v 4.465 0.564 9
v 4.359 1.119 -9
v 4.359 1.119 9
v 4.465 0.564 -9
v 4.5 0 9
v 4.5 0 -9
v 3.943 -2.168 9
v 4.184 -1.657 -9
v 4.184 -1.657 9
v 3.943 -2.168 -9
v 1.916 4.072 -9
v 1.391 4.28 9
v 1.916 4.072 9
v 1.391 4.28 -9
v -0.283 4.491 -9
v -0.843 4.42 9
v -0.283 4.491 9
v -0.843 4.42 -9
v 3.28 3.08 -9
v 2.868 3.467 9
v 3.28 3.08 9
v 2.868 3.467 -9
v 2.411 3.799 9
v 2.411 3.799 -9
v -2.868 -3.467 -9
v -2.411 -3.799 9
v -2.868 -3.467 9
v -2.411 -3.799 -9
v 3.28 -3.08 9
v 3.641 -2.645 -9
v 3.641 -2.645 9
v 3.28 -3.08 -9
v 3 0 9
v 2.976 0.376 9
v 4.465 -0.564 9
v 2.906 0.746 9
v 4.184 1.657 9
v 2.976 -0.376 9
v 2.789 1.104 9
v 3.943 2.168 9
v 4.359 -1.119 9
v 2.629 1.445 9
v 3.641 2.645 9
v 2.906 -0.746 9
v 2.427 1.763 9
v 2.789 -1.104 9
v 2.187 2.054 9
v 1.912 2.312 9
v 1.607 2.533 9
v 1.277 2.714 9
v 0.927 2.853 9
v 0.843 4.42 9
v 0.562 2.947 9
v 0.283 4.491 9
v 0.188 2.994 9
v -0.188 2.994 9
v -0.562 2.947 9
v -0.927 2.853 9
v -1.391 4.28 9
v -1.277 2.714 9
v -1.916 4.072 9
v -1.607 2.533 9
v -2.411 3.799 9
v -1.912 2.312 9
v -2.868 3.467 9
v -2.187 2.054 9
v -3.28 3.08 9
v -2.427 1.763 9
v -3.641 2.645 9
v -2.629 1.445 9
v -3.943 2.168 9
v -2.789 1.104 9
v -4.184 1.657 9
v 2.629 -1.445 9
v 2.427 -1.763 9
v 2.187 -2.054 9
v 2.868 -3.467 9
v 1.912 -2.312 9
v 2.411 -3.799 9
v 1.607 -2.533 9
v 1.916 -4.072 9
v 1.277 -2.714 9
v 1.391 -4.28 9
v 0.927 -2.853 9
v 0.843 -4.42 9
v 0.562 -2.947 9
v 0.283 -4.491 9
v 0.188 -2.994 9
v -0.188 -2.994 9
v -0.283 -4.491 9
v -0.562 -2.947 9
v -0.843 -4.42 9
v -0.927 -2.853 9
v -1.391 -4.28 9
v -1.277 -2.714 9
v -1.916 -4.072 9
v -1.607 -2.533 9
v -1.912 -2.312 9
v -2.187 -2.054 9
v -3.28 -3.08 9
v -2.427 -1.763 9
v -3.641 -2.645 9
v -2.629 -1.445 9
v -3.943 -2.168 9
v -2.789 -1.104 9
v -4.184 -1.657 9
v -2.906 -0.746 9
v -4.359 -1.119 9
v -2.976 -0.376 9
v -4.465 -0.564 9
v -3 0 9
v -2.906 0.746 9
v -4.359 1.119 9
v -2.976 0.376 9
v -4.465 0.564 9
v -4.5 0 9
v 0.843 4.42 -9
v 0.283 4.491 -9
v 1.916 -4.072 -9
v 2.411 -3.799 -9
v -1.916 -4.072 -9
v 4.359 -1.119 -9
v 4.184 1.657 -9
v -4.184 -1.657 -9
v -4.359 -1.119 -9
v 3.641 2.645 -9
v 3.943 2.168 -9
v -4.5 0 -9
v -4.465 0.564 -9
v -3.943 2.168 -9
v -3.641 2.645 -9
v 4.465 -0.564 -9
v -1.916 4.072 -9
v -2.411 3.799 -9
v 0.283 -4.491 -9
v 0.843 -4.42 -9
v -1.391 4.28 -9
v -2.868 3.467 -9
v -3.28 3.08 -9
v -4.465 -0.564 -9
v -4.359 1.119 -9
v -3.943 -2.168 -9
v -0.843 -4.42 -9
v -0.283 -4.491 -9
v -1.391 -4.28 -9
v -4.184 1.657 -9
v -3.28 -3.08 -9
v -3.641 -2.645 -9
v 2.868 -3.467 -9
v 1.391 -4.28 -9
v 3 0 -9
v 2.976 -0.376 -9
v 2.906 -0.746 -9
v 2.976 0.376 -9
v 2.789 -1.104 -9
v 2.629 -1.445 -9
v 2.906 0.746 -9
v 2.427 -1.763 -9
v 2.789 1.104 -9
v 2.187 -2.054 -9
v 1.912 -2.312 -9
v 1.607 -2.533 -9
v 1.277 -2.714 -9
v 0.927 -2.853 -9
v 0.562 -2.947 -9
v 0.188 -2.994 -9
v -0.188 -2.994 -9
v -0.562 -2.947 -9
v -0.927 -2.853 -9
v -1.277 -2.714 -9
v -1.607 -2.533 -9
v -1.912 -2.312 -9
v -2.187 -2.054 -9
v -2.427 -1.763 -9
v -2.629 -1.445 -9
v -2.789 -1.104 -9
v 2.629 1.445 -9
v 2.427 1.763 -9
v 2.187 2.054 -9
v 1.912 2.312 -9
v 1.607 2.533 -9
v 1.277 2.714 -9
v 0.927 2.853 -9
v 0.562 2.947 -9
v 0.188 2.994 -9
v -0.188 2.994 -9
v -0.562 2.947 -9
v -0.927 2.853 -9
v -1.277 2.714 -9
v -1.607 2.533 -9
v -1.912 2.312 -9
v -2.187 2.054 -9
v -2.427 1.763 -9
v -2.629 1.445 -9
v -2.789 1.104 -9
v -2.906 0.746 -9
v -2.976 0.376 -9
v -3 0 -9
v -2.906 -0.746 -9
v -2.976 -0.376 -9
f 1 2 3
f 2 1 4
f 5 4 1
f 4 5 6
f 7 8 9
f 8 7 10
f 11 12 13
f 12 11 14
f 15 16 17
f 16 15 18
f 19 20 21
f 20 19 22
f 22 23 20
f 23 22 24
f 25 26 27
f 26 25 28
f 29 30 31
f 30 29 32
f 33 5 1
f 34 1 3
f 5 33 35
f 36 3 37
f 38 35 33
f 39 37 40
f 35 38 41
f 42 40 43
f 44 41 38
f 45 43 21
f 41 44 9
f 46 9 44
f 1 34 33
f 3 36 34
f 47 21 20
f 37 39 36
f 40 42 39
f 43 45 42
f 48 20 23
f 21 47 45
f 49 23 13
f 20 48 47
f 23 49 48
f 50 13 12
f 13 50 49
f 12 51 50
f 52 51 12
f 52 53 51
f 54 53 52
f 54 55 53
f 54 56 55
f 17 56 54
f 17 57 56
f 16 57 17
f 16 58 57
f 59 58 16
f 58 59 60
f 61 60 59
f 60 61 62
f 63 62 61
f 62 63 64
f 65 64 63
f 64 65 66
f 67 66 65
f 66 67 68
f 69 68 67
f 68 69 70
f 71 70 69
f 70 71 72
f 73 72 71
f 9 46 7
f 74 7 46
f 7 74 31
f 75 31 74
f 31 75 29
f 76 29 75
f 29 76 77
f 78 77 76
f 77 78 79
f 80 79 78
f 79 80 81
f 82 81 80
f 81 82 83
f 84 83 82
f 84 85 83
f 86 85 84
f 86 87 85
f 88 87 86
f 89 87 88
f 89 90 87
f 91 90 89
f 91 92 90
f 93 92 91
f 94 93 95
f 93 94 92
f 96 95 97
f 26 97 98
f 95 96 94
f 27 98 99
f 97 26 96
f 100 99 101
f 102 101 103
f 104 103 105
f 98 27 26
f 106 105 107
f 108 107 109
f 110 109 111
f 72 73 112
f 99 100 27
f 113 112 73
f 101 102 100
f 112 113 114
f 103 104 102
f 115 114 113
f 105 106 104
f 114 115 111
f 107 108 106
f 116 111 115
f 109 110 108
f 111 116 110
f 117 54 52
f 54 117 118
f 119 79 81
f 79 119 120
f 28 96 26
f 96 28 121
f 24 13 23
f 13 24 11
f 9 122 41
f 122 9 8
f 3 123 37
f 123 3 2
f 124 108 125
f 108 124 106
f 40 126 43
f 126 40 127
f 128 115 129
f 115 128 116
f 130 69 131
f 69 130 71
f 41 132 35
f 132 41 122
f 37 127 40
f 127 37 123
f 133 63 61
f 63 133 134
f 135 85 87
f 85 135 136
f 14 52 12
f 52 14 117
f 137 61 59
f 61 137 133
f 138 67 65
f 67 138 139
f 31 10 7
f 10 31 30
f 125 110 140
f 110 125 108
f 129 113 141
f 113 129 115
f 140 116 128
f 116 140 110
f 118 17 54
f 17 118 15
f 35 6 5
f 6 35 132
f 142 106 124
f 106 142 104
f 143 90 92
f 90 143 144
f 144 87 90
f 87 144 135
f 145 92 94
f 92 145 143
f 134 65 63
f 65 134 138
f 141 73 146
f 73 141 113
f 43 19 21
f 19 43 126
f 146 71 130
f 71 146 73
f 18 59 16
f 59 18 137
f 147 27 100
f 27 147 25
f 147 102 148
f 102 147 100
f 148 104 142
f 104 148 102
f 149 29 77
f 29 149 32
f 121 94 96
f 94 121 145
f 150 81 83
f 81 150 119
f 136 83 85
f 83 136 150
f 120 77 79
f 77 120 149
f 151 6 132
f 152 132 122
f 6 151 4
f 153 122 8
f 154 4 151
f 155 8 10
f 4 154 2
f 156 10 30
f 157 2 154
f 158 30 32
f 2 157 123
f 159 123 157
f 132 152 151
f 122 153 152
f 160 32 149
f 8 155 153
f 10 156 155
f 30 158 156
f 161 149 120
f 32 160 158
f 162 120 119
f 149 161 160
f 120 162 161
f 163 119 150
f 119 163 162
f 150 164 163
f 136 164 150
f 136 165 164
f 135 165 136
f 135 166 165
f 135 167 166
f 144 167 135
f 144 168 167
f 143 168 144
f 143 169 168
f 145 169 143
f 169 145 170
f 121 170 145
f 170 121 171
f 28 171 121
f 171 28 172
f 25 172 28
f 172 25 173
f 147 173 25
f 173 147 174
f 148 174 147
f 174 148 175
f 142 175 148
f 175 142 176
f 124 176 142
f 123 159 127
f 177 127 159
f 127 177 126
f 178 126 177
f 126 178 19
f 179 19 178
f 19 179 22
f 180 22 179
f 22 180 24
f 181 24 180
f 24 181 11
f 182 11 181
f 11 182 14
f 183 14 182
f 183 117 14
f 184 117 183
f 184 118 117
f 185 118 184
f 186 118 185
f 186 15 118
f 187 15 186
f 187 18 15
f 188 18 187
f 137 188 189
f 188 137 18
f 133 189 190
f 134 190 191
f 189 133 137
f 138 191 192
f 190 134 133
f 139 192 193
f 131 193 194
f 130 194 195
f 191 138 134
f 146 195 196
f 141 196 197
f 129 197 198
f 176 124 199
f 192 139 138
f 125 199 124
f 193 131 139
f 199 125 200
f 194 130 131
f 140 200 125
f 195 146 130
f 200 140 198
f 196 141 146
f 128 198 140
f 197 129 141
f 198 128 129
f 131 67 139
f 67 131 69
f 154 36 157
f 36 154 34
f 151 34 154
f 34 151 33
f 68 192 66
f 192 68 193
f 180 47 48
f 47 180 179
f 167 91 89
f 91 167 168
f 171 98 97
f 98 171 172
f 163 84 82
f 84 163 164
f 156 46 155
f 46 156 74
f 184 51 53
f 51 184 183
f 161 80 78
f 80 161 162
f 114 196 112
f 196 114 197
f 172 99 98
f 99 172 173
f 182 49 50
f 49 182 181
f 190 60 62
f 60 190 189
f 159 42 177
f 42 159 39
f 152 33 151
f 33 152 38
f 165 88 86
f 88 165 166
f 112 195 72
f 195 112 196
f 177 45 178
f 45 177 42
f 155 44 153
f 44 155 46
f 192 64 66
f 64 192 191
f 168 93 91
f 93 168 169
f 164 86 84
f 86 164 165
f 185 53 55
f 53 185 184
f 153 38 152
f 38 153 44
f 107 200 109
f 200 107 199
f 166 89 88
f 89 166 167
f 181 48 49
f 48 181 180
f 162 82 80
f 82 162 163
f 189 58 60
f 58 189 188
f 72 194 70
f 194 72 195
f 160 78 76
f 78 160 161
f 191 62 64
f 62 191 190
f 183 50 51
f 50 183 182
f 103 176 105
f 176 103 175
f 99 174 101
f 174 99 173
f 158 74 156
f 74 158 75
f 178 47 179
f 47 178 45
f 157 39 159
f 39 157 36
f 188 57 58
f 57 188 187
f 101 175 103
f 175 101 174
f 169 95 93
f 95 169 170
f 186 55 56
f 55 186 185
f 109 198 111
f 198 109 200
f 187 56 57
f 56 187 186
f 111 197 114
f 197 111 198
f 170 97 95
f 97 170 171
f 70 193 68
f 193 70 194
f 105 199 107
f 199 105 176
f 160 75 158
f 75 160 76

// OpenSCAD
$fn = 50;


difference() {
	union() {
		translate(v = [0, 0, -9.0000000000]) {
			cylinder(h = 18, r = 4.5000000000);
		}
	}
	union() {
		translate(v = [0, 0, -100.0000000000]) {
			cylinder(h = 200, r = 3.0000000000);
		}
	}
}
